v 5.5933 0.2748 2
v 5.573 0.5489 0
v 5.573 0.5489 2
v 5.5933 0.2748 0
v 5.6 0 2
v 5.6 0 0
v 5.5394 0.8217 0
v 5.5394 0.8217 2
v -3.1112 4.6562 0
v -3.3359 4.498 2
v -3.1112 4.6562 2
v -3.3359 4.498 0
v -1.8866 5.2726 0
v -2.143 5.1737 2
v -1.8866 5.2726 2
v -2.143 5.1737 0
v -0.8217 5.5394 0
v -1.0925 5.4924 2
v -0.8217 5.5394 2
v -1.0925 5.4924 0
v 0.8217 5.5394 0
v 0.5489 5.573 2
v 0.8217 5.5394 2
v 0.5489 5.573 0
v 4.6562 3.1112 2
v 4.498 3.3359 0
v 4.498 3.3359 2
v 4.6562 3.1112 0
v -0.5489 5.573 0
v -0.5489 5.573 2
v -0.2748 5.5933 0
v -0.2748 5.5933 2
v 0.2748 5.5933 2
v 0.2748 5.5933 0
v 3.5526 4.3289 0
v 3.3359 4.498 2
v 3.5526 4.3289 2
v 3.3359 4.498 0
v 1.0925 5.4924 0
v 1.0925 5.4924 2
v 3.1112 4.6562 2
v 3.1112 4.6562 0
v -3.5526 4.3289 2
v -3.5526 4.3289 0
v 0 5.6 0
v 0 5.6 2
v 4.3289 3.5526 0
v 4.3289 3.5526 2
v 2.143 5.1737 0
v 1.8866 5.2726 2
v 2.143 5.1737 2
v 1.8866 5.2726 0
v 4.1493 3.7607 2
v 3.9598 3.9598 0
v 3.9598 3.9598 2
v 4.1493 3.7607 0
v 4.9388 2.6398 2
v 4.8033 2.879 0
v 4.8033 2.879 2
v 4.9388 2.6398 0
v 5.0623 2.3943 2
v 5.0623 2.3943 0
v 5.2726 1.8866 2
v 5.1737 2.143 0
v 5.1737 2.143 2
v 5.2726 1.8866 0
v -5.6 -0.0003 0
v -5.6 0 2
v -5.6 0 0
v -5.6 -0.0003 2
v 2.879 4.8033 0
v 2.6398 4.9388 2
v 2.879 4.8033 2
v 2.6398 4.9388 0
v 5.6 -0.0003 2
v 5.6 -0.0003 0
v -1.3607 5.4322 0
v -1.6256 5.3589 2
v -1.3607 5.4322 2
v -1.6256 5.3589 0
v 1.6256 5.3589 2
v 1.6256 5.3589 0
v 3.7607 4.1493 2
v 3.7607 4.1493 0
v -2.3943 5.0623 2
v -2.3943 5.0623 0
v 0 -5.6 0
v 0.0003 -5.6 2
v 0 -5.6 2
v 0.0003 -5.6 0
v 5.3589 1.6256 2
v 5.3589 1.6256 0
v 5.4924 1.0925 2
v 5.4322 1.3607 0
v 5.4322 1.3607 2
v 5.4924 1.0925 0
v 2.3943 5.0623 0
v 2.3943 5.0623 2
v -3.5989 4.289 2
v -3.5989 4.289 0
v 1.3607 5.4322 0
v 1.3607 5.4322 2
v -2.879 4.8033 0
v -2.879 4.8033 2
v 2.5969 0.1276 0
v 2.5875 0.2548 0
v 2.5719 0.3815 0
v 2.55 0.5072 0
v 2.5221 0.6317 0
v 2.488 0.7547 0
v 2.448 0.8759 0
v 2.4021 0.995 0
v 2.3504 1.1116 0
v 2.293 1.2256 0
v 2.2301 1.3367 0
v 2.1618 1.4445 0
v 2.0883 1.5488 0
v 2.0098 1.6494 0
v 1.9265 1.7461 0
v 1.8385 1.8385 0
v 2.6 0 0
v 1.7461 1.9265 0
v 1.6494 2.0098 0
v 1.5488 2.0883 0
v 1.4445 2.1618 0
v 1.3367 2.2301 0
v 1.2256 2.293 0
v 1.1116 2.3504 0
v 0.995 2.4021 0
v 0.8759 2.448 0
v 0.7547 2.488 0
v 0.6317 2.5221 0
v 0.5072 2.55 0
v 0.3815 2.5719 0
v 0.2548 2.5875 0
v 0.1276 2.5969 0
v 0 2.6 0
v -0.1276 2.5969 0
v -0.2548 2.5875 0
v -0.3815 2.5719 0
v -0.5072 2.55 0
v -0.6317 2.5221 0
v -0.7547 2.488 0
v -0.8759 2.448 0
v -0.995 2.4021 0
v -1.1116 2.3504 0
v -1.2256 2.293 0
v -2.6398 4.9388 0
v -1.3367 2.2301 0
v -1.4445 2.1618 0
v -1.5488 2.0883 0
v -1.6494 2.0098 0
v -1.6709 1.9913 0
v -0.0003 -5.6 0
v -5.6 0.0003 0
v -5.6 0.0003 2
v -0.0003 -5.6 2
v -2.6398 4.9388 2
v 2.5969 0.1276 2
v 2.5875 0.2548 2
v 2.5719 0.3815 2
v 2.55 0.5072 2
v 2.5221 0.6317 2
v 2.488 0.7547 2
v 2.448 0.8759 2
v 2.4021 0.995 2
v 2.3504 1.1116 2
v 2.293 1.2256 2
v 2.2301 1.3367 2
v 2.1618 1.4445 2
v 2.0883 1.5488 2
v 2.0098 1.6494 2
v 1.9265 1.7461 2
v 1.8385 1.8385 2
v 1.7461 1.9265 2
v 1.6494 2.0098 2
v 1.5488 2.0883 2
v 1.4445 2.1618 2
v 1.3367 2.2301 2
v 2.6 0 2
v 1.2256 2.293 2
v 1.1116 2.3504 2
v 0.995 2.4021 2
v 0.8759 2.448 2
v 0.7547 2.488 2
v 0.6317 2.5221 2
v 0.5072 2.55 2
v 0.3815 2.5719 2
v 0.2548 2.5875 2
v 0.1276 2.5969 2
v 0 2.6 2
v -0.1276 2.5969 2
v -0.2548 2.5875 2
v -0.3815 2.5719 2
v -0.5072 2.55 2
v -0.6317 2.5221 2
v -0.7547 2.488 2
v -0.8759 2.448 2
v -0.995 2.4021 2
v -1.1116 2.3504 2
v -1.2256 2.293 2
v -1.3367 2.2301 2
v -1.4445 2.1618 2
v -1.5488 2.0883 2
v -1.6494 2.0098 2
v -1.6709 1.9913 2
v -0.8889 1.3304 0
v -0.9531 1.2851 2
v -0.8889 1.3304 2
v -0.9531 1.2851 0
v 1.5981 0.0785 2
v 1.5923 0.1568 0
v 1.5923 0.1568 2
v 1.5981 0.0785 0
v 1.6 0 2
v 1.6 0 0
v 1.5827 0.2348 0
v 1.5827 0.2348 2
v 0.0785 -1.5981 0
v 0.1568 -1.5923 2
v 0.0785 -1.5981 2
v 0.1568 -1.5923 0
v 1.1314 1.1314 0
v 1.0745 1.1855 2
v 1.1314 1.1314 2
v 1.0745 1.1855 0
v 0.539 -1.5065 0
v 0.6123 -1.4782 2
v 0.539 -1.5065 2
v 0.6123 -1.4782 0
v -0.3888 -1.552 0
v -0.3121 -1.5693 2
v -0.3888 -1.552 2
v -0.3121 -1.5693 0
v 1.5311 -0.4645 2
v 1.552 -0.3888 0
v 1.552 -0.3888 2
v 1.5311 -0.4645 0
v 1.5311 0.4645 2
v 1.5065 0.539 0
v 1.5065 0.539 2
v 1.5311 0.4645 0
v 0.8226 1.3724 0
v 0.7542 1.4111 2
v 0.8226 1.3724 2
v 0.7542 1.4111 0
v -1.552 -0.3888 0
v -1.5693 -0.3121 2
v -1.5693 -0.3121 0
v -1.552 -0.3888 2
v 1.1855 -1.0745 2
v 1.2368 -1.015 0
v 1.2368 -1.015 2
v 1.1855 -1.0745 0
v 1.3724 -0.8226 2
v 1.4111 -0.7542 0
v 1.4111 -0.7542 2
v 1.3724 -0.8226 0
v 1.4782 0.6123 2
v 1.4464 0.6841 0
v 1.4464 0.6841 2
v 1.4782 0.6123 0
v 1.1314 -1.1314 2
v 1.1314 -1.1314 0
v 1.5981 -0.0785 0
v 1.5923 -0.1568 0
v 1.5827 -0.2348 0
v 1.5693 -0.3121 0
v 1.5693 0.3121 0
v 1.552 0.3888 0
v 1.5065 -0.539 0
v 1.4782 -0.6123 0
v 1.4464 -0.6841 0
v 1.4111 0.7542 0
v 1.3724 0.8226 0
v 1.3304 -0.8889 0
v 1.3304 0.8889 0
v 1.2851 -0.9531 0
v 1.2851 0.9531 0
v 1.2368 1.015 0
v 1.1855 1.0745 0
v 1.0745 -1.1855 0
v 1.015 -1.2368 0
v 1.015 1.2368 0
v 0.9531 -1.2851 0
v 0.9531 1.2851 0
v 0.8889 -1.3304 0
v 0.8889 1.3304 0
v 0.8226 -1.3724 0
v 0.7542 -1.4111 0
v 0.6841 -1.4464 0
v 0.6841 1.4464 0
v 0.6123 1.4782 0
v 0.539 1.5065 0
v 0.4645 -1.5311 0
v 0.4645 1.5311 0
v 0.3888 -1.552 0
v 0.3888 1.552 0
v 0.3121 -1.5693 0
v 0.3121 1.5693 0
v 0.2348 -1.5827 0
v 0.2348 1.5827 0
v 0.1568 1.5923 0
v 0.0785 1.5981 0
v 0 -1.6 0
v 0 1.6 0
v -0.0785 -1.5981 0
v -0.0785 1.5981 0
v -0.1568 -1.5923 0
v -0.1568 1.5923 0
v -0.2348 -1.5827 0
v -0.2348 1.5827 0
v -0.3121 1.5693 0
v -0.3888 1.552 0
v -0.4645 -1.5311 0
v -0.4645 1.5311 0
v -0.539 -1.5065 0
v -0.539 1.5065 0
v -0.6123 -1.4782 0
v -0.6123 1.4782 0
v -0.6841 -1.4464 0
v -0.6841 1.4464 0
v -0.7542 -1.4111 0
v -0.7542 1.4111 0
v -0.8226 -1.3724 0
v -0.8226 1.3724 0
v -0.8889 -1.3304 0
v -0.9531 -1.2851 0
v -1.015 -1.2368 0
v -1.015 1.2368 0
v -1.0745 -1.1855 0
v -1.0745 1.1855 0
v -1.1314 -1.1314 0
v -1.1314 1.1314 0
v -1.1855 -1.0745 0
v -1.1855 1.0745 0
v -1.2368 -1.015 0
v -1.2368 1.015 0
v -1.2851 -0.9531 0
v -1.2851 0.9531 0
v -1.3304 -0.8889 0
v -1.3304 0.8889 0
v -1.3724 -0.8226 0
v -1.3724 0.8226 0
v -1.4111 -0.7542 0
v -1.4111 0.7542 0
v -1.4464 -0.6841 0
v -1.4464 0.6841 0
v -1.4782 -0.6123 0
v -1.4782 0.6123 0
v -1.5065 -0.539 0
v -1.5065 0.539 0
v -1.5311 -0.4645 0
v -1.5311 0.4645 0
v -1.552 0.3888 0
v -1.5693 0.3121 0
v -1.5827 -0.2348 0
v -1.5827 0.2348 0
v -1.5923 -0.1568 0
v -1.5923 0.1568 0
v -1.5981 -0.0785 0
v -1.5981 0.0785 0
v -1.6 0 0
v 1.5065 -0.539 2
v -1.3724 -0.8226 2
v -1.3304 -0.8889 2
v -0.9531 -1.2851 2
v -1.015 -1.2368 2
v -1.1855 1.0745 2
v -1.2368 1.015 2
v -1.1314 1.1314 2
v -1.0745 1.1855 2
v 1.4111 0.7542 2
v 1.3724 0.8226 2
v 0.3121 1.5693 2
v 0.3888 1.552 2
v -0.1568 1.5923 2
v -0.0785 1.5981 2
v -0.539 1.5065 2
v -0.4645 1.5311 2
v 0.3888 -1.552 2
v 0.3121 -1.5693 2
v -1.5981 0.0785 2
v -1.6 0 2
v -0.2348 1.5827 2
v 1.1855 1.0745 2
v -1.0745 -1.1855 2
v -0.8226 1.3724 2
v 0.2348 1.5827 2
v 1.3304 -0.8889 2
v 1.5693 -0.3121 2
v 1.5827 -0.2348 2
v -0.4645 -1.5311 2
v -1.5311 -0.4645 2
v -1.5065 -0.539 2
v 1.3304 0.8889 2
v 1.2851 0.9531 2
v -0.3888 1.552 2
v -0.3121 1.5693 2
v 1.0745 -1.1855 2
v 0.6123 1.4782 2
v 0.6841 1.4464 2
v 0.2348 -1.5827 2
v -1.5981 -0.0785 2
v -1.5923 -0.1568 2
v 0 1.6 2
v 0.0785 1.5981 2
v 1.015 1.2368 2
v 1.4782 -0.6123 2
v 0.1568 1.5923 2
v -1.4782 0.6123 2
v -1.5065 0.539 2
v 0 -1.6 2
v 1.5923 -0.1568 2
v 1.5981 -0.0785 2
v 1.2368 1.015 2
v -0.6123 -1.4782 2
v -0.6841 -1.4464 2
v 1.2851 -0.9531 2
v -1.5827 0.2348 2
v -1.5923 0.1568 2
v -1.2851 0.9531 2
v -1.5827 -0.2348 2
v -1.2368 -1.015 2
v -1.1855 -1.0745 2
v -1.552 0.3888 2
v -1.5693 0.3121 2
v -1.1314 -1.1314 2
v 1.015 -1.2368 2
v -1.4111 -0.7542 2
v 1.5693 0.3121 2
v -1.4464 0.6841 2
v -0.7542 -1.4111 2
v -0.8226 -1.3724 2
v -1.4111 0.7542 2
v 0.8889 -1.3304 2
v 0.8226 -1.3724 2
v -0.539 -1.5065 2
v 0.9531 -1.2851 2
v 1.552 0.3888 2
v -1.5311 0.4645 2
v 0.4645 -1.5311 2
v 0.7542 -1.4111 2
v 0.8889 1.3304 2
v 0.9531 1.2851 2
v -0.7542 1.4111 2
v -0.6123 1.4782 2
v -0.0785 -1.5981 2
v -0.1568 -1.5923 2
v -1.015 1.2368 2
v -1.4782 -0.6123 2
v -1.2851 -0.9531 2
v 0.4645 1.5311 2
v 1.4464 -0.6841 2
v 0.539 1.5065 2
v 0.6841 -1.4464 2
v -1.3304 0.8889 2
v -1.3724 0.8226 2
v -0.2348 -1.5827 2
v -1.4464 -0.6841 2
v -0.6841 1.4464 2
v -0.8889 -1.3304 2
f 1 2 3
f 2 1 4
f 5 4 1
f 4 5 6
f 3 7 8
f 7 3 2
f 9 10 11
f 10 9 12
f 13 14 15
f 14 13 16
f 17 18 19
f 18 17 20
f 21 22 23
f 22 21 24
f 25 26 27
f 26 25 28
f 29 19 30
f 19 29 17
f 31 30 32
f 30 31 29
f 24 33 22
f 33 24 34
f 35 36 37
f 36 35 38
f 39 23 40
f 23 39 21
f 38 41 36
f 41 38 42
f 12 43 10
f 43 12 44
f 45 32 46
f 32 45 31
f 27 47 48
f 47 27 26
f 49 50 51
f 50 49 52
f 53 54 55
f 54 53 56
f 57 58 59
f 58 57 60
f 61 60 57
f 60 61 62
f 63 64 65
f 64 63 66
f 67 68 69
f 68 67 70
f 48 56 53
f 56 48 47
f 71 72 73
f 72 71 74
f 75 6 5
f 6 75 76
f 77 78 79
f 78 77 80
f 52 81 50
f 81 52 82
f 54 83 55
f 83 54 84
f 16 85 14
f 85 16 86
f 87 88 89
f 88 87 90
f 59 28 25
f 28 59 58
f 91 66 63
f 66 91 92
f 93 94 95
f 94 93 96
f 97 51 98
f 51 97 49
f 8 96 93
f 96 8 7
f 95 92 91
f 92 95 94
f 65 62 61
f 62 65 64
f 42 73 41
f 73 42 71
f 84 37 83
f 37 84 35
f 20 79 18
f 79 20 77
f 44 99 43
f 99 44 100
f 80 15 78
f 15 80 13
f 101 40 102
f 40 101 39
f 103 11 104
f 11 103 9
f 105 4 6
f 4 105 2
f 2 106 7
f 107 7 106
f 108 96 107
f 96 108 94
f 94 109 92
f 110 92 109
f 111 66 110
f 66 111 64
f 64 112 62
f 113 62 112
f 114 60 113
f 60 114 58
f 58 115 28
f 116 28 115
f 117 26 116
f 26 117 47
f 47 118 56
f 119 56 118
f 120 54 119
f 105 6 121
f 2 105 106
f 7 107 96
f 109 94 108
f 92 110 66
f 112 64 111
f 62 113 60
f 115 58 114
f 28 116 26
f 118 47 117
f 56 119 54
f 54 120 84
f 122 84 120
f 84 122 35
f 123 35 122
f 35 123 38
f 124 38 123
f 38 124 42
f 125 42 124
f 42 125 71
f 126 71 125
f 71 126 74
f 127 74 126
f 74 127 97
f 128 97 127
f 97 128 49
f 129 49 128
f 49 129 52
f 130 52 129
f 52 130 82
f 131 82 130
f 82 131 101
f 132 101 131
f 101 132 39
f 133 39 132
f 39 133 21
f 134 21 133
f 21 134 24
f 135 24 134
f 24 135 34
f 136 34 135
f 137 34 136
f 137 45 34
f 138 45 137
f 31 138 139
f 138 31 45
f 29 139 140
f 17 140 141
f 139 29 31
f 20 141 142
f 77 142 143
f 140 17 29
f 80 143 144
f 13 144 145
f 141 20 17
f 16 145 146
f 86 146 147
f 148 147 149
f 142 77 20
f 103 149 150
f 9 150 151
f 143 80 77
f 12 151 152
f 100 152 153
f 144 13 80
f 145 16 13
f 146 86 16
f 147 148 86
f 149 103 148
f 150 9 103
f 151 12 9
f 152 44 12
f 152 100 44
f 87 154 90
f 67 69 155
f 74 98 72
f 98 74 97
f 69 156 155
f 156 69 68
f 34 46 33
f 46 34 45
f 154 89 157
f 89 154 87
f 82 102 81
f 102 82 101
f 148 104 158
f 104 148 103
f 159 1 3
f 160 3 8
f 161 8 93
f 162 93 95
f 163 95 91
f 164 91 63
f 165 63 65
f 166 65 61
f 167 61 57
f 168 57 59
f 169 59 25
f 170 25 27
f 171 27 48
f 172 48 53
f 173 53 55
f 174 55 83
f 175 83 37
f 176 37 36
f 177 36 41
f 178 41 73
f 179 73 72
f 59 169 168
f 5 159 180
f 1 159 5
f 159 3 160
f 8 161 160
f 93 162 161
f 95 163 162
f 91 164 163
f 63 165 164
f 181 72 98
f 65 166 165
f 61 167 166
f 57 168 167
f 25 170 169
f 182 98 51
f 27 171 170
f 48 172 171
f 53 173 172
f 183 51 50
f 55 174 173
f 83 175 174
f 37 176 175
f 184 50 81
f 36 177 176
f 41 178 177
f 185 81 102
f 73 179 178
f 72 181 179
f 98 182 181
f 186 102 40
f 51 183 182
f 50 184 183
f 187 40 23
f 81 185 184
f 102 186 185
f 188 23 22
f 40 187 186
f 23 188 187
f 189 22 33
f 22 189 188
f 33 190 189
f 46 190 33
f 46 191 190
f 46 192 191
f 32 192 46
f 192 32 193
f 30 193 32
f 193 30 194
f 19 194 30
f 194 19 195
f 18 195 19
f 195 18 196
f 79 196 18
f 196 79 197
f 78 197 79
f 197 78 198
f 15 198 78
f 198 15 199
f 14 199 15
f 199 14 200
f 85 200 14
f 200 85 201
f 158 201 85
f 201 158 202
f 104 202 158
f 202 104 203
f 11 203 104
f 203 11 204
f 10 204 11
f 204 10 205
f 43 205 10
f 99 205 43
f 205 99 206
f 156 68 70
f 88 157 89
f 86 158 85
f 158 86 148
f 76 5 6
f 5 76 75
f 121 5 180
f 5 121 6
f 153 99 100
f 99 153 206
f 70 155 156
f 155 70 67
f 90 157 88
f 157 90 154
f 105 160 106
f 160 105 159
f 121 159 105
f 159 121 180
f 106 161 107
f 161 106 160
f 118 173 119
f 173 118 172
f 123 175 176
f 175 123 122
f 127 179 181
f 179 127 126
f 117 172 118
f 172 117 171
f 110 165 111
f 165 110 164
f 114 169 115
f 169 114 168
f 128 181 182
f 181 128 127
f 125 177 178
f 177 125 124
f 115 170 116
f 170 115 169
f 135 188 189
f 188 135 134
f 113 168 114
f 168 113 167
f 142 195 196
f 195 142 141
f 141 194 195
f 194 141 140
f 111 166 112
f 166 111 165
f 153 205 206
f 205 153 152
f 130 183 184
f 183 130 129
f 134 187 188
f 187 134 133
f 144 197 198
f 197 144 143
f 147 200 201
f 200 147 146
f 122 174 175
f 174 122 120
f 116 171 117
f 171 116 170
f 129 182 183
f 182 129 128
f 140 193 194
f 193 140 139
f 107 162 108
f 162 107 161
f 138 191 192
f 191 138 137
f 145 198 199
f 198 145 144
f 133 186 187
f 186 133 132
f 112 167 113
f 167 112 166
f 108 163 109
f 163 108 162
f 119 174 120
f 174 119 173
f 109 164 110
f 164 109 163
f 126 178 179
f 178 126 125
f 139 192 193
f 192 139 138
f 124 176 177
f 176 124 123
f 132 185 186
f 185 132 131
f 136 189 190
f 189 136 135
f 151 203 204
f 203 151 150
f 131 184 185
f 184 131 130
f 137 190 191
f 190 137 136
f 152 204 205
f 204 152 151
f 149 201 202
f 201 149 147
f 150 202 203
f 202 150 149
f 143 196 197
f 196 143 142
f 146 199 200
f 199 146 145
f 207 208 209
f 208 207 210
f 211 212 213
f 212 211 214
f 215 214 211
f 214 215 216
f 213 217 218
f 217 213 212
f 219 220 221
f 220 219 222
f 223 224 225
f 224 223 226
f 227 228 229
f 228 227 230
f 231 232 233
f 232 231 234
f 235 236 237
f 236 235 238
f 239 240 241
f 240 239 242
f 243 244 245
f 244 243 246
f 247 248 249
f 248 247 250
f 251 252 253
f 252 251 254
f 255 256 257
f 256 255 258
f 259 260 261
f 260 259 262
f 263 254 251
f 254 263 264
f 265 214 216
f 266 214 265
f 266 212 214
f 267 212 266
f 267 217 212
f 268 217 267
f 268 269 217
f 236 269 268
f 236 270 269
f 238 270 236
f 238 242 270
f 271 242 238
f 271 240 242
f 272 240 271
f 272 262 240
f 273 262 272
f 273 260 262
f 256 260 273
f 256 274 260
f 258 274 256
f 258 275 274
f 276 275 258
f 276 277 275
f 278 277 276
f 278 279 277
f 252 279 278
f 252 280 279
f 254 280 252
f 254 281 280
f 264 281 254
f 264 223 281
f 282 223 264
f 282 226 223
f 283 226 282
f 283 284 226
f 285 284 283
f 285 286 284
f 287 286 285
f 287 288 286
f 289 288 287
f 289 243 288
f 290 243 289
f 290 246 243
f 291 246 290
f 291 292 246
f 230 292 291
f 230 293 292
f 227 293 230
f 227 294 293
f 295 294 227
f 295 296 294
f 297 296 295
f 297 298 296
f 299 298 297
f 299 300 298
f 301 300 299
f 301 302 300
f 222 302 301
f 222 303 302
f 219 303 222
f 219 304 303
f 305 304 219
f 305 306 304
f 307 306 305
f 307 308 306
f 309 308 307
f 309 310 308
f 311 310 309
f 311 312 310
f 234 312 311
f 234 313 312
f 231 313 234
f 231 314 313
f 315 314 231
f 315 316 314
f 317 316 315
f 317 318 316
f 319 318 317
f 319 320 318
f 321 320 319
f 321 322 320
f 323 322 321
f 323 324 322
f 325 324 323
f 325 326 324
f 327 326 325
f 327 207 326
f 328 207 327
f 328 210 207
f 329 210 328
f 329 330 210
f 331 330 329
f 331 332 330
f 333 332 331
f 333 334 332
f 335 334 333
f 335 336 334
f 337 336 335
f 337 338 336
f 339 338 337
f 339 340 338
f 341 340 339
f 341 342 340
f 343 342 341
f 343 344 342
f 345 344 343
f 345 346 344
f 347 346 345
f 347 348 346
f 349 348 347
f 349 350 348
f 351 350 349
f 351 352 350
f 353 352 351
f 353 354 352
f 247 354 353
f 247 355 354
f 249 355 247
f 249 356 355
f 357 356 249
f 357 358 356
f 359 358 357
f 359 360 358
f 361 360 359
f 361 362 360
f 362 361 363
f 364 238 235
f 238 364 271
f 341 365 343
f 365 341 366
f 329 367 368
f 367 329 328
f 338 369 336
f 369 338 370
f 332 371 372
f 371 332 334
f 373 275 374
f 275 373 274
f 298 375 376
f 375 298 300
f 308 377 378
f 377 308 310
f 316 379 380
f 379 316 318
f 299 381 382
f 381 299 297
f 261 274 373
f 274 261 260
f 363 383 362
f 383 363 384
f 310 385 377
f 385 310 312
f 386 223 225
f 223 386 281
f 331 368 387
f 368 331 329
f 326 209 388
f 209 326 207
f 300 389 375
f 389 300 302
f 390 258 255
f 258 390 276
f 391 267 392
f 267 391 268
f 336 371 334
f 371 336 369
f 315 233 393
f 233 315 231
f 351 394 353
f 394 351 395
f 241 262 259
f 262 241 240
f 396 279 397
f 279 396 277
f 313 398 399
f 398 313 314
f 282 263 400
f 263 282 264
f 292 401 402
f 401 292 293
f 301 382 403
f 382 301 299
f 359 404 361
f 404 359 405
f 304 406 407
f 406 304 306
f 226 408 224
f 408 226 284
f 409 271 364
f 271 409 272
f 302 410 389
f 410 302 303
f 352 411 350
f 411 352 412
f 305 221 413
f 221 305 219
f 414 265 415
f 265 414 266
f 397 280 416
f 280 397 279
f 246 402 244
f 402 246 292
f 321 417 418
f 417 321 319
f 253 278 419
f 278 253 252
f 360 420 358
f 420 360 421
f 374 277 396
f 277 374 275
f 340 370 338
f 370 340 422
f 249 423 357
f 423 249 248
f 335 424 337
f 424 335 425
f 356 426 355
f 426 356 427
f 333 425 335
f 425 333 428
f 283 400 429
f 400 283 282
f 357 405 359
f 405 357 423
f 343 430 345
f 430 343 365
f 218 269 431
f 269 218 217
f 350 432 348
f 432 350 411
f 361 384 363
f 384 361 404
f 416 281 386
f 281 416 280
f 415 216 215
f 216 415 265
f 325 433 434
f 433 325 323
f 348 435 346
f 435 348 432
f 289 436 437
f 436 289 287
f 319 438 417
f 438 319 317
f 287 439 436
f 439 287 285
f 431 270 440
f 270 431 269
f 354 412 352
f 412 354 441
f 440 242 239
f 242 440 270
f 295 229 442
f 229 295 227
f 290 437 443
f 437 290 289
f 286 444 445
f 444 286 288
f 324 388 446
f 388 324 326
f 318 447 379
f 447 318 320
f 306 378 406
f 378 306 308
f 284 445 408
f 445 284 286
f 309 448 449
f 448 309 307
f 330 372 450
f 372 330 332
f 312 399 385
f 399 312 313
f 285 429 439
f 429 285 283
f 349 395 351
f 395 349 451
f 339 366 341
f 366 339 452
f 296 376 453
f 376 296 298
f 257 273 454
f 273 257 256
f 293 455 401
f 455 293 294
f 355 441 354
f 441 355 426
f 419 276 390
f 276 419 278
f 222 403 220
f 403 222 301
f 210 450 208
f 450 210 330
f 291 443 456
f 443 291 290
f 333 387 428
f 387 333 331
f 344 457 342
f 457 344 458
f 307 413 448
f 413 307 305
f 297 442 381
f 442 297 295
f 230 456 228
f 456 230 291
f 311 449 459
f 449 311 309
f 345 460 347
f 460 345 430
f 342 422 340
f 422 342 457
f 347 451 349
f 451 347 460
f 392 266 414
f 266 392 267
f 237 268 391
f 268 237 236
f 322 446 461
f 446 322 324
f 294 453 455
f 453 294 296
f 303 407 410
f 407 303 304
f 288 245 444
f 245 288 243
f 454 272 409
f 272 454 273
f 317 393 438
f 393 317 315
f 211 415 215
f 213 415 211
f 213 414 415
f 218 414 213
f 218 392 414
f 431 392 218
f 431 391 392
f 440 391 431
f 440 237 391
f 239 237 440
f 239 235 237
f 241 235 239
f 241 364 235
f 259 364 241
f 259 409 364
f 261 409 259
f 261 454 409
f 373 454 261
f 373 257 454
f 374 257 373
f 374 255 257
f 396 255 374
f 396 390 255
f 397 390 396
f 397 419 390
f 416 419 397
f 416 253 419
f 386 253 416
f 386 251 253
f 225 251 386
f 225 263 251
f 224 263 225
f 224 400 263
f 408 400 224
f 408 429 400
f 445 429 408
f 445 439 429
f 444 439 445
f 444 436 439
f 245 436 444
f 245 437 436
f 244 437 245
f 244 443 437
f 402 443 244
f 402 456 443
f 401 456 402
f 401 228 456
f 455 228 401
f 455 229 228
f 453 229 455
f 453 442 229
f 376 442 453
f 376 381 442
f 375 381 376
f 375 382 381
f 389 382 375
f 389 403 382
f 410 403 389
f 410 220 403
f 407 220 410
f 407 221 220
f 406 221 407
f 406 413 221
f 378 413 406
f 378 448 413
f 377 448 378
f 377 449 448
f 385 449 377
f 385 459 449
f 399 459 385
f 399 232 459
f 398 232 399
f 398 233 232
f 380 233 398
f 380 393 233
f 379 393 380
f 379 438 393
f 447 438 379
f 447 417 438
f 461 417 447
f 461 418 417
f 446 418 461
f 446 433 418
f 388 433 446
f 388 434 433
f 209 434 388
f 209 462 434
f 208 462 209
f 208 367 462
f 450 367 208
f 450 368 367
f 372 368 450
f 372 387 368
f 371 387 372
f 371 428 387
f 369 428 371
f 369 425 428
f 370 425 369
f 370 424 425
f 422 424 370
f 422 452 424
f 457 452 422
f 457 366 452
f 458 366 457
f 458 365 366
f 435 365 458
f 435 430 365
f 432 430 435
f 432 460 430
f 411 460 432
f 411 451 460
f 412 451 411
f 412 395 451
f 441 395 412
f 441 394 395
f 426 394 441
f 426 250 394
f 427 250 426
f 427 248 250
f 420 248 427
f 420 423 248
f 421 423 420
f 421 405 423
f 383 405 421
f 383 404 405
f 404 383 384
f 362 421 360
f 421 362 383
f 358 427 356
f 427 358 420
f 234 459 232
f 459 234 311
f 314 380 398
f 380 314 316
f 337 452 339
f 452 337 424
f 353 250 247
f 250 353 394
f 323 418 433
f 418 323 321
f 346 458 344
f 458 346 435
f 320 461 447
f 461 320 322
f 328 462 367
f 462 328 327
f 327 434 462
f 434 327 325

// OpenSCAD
preview_res = 48;
$fn = $preview ? preview_res : 128; // resolution of stacked polygons (number of sides)

wire_diameter=1;
support_radius = 1.5;
bender_height=2;
bender_wall_thickness=3;
radius_over_margin=0.1;
nil = $preview ? 0.01 : 0;

cylinder(h=bender_height, r=support_radius + radius_over_margin, center=false);

module arc(h, outer, inner, degrees, center=false)
{
    degrees = degrees % 360;
    mult = outer*2;
    nil = $preview ? 0.01 : 0;
    difference()
    {
        difference()
        {   
            cylinder(h=h, r=outer, center=center);
        
            translate([0,0,-nil])
                linear_extrude(h+2*nil)
                {
                    rotate([0,0, 90 * floor(degrees/90)])
                    difference()
                    {
                        square([outer, outer]);
                        polygon([[mult, 0], [0,0], [cos(degrees%90) * mult, sin(degrees%90) * mult]]);
                    }
                    if(degrees < 90)
                        translate([-outer,0,0])
                            square([outer, outer]);
                    
                    if(degrees < 180)
                        translate([-outer,-outer,0])
                            square([outer, outer]);
                    
                    if(degrees < 270)
                        translate([0,-outer,0])
                            square([outer, outer]);
                }                
        }
        translate([0,0,-nil])
            cylinder(h=h+2*nil, r=inner, center=center);
    }
}

rotate([0, 0, $t * 360])
{
    inner = support_radius + radius_over_margin  + wire_diameter;
    outer = inner + bender_wall_thickness;
    arc(h=bender_height, outer=outer, inner=inner, degrees=130, center=false);
}
